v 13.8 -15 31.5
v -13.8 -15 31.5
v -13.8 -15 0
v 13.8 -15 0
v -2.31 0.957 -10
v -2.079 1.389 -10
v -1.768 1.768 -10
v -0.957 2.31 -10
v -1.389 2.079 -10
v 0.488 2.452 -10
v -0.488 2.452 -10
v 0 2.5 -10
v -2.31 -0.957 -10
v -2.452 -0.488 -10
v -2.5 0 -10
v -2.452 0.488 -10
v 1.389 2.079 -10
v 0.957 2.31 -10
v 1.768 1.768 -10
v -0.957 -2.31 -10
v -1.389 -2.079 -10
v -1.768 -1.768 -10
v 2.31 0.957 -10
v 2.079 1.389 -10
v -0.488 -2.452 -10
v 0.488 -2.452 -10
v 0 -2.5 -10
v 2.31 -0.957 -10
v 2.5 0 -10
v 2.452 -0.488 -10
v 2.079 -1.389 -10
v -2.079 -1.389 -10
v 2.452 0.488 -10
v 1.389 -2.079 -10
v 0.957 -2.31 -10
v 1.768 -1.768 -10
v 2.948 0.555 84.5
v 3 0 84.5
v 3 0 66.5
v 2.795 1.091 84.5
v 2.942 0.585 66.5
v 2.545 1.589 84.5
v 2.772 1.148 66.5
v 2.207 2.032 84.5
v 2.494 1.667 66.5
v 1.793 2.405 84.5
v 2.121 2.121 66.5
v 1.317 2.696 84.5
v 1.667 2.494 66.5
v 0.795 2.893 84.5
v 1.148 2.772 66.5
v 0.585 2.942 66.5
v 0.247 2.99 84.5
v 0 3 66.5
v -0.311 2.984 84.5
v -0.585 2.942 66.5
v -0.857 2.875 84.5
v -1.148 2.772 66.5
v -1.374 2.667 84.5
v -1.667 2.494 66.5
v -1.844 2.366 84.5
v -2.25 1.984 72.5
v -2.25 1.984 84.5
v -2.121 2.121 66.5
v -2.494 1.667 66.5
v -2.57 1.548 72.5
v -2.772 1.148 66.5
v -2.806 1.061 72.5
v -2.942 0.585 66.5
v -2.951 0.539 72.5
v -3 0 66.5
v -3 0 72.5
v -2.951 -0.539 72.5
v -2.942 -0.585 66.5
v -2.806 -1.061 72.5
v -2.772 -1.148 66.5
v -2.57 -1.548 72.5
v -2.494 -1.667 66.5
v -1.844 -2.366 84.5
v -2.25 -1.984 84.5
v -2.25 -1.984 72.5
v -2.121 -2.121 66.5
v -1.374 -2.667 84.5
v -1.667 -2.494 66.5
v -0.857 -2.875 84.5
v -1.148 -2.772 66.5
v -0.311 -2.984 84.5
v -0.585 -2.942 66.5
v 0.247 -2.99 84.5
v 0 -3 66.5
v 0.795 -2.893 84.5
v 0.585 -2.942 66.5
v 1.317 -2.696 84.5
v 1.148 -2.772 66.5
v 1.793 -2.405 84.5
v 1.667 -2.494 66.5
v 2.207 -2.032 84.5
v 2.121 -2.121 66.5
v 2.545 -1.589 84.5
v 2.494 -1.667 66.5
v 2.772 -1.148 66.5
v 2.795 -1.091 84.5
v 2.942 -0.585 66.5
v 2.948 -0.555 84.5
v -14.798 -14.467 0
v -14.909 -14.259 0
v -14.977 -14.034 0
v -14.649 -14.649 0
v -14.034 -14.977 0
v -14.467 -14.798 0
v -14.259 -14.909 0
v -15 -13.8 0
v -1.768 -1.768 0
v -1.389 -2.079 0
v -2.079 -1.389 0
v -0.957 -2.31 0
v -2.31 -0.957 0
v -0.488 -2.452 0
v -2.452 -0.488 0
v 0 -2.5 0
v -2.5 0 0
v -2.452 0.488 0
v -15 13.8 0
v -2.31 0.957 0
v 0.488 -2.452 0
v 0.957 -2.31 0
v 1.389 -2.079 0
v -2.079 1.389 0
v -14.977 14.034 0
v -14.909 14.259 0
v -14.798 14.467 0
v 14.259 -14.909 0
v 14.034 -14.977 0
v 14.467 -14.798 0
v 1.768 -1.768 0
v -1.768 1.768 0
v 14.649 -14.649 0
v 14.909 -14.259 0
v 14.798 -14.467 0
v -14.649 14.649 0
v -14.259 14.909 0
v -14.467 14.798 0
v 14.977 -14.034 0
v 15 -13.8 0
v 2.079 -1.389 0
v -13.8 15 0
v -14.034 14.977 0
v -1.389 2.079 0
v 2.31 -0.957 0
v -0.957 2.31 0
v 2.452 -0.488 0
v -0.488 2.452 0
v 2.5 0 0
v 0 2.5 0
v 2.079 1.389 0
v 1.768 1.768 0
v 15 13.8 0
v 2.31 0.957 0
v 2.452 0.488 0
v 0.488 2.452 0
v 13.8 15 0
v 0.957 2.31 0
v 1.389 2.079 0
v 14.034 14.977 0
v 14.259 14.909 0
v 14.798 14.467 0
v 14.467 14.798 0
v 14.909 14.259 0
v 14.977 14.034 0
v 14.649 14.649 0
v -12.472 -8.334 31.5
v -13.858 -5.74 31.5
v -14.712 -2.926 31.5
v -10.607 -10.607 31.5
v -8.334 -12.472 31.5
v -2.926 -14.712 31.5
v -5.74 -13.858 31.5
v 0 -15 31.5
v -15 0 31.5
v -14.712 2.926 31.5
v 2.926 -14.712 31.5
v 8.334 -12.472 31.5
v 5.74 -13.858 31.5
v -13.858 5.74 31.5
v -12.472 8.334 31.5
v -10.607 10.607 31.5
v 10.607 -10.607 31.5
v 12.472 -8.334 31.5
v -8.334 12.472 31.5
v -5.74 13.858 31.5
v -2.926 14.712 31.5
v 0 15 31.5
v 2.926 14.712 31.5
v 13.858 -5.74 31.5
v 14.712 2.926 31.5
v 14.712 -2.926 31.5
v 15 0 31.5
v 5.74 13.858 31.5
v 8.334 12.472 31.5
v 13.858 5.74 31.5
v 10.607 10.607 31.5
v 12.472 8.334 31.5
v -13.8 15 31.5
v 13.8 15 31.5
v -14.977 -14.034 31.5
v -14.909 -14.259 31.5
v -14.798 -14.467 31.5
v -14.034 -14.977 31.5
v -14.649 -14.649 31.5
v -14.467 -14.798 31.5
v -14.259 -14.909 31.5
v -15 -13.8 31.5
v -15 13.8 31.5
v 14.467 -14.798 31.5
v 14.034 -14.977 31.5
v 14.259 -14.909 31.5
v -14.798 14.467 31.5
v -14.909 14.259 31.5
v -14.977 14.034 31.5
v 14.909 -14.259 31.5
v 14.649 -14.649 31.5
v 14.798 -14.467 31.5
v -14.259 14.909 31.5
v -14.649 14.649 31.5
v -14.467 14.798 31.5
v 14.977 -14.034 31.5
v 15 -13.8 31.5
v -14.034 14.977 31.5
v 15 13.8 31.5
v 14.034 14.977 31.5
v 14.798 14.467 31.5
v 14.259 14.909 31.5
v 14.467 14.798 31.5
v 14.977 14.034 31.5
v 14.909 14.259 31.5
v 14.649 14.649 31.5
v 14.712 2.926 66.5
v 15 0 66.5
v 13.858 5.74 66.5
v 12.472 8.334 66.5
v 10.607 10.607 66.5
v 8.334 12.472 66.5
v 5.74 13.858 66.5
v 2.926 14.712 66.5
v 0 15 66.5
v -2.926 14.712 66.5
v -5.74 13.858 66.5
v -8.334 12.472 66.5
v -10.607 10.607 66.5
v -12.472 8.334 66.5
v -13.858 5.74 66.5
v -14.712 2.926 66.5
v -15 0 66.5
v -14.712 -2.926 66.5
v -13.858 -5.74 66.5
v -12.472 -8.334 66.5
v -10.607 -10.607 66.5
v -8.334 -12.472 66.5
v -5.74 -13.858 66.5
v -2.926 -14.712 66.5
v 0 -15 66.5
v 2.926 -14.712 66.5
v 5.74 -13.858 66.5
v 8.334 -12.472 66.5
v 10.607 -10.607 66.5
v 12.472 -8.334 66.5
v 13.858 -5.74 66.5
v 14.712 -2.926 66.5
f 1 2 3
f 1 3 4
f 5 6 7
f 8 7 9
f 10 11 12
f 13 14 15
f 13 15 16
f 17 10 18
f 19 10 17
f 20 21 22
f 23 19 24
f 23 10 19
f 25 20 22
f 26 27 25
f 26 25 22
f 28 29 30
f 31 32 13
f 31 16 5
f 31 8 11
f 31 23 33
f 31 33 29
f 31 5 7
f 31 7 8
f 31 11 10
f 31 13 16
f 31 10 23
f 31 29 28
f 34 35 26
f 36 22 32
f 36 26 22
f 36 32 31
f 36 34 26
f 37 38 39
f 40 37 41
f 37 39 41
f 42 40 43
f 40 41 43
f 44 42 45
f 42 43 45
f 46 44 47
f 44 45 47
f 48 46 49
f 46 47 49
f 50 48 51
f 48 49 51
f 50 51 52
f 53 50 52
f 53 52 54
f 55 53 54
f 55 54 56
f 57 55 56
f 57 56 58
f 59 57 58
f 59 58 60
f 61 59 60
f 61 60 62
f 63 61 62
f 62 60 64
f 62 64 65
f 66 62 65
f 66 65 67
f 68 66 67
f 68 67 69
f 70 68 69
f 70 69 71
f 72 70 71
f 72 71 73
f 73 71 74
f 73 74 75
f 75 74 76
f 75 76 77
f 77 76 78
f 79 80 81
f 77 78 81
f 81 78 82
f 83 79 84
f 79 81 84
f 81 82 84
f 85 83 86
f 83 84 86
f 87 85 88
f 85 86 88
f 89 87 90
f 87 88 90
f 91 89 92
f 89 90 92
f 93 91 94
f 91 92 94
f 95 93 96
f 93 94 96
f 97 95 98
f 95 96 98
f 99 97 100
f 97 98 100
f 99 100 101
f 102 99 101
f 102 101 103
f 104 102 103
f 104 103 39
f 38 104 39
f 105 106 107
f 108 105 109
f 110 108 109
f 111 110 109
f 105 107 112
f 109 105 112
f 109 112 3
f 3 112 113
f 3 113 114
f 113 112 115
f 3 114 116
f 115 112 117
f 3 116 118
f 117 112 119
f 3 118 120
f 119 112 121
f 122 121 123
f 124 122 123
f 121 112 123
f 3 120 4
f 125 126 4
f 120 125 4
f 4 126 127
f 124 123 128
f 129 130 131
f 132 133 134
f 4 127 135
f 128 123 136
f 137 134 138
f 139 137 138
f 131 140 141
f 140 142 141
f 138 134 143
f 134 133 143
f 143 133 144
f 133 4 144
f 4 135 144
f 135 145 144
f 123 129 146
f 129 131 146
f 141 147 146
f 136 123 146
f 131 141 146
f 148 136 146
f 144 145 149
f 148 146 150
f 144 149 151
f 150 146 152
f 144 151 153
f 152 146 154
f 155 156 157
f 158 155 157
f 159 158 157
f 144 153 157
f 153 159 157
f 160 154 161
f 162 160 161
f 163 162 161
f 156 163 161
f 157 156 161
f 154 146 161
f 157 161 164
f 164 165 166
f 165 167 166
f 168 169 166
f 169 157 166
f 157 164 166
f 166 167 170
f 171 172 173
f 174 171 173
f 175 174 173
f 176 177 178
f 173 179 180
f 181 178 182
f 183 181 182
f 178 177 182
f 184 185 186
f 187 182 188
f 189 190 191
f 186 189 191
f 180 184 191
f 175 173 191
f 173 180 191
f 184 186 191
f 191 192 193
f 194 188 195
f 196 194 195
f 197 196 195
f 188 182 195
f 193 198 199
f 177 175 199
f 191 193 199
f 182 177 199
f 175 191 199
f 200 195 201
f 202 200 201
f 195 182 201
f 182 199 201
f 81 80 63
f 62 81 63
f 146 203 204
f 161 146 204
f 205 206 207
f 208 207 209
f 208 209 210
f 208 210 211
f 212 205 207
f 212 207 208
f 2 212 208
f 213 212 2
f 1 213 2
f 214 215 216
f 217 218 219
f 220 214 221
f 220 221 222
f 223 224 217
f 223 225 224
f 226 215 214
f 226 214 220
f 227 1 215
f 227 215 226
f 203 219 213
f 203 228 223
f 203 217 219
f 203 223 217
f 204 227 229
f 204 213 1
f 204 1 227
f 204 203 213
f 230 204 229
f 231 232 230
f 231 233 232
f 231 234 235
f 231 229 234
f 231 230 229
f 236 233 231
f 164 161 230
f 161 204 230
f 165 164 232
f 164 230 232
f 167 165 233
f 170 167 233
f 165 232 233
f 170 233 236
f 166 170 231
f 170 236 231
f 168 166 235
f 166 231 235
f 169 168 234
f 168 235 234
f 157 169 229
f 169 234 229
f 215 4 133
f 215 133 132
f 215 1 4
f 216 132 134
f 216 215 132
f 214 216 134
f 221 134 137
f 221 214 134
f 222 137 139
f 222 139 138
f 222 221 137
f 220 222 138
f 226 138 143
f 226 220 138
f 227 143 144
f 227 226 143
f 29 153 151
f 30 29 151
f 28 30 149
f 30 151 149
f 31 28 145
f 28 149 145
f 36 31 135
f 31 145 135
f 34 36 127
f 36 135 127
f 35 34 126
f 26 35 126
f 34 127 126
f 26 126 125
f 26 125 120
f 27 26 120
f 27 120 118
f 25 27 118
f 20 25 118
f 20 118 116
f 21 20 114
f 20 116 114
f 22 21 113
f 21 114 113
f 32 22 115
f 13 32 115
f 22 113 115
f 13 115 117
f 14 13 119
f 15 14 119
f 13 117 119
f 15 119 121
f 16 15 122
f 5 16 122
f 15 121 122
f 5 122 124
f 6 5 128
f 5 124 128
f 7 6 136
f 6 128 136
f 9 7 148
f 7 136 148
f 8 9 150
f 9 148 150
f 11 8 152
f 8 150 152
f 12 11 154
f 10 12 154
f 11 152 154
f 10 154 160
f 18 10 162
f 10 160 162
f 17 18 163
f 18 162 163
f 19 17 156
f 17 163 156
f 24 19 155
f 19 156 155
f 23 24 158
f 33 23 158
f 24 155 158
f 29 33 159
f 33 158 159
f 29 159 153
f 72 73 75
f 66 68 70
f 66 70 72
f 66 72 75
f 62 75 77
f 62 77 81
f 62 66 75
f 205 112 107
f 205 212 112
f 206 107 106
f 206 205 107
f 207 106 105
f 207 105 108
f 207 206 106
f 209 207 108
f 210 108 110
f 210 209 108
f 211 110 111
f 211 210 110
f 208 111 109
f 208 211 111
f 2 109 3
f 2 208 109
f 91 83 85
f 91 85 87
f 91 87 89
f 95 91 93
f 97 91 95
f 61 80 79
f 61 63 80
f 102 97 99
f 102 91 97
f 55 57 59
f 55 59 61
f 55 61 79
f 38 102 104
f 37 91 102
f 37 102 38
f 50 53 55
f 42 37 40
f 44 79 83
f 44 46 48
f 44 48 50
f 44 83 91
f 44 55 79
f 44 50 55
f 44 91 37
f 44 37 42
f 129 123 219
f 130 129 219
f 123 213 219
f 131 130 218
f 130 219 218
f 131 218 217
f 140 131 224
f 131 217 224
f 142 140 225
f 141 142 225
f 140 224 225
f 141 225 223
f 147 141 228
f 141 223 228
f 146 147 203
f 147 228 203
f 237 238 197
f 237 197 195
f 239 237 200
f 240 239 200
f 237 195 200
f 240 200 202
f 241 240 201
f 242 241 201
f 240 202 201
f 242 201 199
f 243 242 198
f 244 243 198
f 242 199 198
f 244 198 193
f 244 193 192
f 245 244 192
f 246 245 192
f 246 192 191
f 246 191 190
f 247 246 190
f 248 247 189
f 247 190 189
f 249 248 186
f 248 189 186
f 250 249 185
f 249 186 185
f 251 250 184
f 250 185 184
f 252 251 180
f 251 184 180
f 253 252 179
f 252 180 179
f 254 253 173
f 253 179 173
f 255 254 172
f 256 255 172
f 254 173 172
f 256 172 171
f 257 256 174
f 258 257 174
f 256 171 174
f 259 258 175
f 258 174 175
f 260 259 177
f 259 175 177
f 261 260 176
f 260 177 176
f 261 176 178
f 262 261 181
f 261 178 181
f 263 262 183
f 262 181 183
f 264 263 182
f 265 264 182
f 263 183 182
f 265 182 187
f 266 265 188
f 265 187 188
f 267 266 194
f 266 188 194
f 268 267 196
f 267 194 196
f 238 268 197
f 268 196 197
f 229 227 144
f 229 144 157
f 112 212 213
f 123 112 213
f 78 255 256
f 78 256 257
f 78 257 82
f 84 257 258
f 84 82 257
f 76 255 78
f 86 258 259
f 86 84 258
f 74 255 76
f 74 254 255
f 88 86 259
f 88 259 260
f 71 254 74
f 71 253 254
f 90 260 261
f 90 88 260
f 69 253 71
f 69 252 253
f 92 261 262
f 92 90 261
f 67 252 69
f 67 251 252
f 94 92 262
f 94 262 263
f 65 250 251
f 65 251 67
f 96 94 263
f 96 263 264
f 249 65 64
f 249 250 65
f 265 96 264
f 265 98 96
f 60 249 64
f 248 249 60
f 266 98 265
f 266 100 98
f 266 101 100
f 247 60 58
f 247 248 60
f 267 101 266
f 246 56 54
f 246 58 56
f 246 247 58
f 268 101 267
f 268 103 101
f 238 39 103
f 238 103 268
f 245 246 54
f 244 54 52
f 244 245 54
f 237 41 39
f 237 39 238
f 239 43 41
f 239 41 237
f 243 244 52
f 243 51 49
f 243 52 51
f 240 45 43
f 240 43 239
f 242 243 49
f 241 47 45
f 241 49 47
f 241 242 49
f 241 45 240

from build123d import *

# Parameters (mm, degrees)
F5_W      = 30
F5_H      = 30
F6_DEPTH  = 31.5
F7_R      = 15
F8_DEPTH  = 35
F9_R      = 3
F10_DEPTH = 18
F12_DEPTH = 12
F13_R     = 2.5
F14_DEPTH = 10
F15_R     = 1.2


with BuildPart() as f6:
    # F5 (on Top) → F6 (new body)
    with BuildSketch(Plane.XY):
        Rectangle(F5_W, F5_H)
    extrude(amount=F6_DEPTH)

    # F13 (on face) → F14 (join)
    with BuildSketch(Plane(origin=(0, 0, 0), x_dir=(1, 0, 0), z_dir=(0, 0, -1))):
        Circle(F13_R)
    extrude(amount=F14_DEPTH)

    # F15
    f15_edges = [f6.edges().sort_by_distance(p)[0] for p in [
        (-15, -15, 15.75),
        (15, -15, 15.75),
        (15, 15, 15.75),
        (-15, 15, 15.75),
    ]]
    fillet(f15_edges, radius=F15_R)


with BuildPart() as f8:
    # F7 (on face) → F8 (new body)
    with BuildSketch(Plane.XY.offset(31.5)):
        Circle(F7_R)
    extrude(amount=F8_DEPTH)

    # F9 (on face) → F10 (join)
    with BuildSketch(Plane.XY.offset(66.5)):
        Circle(F9_R)
    extrude(amount=F10_DEPTH)

    # F11 (on face) → F12 (cut)
    with BuildSketch(Plane.XY.offset(84.5)):
        with BuildLine():
            Line((-2.25, -1.9843134833), (-2.25, 1.9843134833))
            ThreePointArc((-2.25, 1.9843134833), (-3, 0), (-2.25, -1.9843134833))
        make_face()
    extrude(amount=-F12_DEPTH, mode=Mode.SUBTRACT)


solid = Compound([f6.part, f8.part])
